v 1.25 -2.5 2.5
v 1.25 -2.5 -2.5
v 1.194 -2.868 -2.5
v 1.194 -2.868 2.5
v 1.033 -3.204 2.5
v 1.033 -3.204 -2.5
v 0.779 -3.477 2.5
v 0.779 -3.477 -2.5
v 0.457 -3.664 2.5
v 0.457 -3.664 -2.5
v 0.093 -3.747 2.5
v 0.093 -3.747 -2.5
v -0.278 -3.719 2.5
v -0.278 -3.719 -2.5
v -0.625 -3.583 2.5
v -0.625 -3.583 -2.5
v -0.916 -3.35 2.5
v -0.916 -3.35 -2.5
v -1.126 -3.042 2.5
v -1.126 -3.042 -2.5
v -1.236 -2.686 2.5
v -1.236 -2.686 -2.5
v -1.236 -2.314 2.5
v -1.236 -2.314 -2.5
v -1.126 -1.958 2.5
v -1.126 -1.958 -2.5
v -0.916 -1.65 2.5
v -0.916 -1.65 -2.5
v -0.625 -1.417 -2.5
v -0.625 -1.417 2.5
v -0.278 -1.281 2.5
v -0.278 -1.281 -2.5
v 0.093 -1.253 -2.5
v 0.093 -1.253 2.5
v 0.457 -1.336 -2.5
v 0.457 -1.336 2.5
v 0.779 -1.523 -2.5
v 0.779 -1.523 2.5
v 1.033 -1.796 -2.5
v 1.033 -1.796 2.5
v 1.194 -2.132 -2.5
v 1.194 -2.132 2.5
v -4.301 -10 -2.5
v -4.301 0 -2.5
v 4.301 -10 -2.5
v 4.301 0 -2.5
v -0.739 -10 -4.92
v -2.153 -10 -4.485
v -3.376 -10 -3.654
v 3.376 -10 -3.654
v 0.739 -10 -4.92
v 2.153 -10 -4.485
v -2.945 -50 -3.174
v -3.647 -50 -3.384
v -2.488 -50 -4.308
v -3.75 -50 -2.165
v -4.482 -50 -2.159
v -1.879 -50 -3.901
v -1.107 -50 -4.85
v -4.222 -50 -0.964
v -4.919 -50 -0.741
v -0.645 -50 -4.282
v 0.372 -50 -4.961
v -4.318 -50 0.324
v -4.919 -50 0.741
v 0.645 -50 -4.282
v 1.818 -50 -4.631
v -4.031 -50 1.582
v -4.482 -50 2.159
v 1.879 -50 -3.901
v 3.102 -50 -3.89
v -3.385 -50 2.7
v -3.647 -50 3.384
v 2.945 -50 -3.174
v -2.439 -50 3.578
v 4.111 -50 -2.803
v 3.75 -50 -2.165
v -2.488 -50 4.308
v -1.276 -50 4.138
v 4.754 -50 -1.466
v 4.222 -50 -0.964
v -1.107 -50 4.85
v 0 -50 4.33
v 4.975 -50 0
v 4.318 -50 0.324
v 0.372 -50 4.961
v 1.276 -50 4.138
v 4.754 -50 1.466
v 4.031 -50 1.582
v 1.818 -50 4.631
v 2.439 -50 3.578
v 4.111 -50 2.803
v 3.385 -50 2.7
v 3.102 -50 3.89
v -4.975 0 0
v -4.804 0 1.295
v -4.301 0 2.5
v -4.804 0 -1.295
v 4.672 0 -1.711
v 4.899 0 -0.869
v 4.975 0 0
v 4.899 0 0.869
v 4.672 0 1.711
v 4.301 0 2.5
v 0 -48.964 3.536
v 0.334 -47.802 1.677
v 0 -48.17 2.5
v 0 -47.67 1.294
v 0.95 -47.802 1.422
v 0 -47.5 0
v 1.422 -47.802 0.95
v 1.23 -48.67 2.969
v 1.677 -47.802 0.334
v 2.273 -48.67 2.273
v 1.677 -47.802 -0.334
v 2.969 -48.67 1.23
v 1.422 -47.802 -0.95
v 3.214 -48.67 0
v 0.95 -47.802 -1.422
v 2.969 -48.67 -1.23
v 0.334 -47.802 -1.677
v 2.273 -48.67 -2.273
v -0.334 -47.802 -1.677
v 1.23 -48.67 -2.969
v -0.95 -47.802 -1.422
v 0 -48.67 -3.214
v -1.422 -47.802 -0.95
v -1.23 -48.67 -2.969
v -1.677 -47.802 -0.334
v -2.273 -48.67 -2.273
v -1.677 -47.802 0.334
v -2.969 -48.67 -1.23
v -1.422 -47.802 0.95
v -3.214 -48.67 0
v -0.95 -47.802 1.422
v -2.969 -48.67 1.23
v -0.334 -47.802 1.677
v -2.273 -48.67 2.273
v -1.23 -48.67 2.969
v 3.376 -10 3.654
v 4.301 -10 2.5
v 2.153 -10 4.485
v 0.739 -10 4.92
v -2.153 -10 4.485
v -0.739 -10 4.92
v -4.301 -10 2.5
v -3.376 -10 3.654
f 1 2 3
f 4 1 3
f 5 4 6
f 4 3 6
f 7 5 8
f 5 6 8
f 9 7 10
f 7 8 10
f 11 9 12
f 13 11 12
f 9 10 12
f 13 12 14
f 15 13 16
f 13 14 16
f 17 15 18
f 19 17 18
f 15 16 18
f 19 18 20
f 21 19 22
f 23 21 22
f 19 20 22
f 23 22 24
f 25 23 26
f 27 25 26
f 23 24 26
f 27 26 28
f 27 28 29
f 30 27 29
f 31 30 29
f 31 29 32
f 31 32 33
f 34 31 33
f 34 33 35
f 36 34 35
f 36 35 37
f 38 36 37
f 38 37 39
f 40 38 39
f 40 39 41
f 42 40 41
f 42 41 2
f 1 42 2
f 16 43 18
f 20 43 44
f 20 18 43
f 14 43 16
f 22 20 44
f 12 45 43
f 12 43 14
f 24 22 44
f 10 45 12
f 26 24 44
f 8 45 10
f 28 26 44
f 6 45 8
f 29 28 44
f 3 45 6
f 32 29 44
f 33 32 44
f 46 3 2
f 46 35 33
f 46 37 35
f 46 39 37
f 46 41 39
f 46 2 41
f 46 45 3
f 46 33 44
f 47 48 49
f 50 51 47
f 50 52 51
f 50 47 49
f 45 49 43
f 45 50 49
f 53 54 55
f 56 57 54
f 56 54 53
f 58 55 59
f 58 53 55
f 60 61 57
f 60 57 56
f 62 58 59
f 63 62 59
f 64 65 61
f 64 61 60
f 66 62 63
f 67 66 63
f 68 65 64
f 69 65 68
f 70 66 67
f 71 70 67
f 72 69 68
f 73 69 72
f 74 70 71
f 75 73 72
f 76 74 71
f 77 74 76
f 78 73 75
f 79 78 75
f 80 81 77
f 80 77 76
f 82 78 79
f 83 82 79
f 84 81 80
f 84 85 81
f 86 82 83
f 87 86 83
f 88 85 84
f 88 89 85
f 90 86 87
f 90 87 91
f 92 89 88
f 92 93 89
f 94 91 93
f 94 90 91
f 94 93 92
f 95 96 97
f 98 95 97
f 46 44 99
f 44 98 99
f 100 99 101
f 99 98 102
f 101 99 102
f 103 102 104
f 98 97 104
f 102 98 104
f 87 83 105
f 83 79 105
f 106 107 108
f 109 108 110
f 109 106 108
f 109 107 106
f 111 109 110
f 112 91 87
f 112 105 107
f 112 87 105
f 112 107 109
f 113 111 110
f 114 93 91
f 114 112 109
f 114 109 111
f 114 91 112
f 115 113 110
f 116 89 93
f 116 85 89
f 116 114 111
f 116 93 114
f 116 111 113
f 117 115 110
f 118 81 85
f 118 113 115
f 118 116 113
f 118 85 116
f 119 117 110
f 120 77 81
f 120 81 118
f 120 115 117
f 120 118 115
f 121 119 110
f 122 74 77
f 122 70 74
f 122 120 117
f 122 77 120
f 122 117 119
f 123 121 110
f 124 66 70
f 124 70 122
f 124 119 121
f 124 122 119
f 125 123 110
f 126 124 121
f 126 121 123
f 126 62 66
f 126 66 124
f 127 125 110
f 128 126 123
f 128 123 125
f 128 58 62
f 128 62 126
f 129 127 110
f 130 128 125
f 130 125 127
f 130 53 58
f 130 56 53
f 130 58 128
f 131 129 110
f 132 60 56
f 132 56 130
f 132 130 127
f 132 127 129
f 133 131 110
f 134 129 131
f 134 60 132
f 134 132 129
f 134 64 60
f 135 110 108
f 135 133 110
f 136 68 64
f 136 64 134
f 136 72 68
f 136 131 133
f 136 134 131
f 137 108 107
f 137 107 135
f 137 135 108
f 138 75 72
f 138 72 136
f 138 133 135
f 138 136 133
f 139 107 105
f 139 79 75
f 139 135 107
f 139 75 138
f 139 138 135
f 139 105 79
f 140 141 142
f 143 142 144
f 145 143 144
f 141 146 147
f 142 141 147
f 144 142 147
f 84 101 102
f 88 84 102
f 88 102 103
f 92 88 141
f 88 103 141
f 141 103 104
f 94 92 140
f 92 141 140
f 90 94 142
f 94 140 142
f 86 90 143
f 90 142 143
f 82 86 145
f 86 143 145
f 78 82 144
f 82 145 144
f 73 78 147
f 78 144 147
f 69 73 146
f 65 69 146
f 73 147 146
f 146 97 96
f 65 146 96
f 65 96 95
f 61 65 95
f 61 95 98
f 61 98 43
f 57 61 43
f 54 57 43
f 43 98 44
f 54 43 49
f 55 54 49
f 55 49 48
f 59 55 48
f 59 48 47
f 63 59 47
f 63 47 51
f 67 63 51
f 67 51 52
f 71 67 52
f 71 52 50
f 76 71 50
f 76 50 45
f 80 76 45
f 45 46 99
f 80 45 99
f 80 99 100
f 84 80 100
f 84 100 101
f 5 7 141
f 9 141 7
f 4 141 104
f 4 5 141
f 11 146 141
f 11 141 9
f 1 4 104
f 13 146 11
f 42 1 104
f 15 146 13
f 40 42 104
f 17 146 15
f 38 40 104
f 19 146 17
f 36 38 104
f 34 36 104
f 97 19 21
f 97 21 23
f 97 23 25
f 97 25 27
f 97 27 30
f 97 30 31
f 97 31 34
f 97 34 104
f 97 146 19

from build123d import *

# Parameters (mm, degrees)
F0_R          = 4.975
F1_DEPTH      = 50
F4_W          = 36.9355937797
F4_H          = 30.9394803881
F4_W_2        = 36.9616359944
F4_H_2        = 51.8604685604
F5_DEPTH      = 4.976
F5_DEPTH_BACK = 4.976
F6_R          = 1.25
F7_DEPTH      = 25


with BuildPart() as f1:
    # F0 (on Front) → F1 (new body)
    with BuildSketch(Plane.XZ):
        Circle(F0_R)
    extrude(amount=F1_DEPTH)

    # F2 (on Right) → F3 (revolve, cut)
    with BuildSketch(Plane.YZ):
        with BuildLine():
            Line((-52.5, 0), (-47.5, 0))
            ThreePointArc((-47.5, 0), (-48.1698729811, 2.5), (-50, 4.3301270189))
            Line((-50, 4.3301270189), (-52.5, 0))
        make_face()
    revolve(axis=Axis((0, -50, 0), (0, 1, 0)), mode=Mode.SUBTRACT)

    # F4 (on Right) → F5 (cut, two sides)
    with BuildSketch(Plane.YZ) as f5_sk:
        with Locations((8.4677968899, 17.9697401941)):
            Rectangle(F4_W, F4_H)
        with Locations((8.4808179972, -28.4302342802)):
            Rectangle(F4_W_2, F4_H_2)
    extrude(amount=-F5_DEPTH, mode=Mode.SUBTRACT)
    extrude(f5_sk.sketch, amount=F5_DEPTH_BACK, mode=Mode.SUBTRACT)

    # F6 (on face) → F7 (cut)
    with BuildSketch(Plane(origin=(0, 0, -2.5), x_dir=(1, 0, 0), z_dir=(0, 0, -1))):
        with Locations((0, 2.5)):
            Circle(F6_R)
    extrude(amount=-F7_DEPTH, mode=Mode.SUBTRACT)


solid = f1.part
